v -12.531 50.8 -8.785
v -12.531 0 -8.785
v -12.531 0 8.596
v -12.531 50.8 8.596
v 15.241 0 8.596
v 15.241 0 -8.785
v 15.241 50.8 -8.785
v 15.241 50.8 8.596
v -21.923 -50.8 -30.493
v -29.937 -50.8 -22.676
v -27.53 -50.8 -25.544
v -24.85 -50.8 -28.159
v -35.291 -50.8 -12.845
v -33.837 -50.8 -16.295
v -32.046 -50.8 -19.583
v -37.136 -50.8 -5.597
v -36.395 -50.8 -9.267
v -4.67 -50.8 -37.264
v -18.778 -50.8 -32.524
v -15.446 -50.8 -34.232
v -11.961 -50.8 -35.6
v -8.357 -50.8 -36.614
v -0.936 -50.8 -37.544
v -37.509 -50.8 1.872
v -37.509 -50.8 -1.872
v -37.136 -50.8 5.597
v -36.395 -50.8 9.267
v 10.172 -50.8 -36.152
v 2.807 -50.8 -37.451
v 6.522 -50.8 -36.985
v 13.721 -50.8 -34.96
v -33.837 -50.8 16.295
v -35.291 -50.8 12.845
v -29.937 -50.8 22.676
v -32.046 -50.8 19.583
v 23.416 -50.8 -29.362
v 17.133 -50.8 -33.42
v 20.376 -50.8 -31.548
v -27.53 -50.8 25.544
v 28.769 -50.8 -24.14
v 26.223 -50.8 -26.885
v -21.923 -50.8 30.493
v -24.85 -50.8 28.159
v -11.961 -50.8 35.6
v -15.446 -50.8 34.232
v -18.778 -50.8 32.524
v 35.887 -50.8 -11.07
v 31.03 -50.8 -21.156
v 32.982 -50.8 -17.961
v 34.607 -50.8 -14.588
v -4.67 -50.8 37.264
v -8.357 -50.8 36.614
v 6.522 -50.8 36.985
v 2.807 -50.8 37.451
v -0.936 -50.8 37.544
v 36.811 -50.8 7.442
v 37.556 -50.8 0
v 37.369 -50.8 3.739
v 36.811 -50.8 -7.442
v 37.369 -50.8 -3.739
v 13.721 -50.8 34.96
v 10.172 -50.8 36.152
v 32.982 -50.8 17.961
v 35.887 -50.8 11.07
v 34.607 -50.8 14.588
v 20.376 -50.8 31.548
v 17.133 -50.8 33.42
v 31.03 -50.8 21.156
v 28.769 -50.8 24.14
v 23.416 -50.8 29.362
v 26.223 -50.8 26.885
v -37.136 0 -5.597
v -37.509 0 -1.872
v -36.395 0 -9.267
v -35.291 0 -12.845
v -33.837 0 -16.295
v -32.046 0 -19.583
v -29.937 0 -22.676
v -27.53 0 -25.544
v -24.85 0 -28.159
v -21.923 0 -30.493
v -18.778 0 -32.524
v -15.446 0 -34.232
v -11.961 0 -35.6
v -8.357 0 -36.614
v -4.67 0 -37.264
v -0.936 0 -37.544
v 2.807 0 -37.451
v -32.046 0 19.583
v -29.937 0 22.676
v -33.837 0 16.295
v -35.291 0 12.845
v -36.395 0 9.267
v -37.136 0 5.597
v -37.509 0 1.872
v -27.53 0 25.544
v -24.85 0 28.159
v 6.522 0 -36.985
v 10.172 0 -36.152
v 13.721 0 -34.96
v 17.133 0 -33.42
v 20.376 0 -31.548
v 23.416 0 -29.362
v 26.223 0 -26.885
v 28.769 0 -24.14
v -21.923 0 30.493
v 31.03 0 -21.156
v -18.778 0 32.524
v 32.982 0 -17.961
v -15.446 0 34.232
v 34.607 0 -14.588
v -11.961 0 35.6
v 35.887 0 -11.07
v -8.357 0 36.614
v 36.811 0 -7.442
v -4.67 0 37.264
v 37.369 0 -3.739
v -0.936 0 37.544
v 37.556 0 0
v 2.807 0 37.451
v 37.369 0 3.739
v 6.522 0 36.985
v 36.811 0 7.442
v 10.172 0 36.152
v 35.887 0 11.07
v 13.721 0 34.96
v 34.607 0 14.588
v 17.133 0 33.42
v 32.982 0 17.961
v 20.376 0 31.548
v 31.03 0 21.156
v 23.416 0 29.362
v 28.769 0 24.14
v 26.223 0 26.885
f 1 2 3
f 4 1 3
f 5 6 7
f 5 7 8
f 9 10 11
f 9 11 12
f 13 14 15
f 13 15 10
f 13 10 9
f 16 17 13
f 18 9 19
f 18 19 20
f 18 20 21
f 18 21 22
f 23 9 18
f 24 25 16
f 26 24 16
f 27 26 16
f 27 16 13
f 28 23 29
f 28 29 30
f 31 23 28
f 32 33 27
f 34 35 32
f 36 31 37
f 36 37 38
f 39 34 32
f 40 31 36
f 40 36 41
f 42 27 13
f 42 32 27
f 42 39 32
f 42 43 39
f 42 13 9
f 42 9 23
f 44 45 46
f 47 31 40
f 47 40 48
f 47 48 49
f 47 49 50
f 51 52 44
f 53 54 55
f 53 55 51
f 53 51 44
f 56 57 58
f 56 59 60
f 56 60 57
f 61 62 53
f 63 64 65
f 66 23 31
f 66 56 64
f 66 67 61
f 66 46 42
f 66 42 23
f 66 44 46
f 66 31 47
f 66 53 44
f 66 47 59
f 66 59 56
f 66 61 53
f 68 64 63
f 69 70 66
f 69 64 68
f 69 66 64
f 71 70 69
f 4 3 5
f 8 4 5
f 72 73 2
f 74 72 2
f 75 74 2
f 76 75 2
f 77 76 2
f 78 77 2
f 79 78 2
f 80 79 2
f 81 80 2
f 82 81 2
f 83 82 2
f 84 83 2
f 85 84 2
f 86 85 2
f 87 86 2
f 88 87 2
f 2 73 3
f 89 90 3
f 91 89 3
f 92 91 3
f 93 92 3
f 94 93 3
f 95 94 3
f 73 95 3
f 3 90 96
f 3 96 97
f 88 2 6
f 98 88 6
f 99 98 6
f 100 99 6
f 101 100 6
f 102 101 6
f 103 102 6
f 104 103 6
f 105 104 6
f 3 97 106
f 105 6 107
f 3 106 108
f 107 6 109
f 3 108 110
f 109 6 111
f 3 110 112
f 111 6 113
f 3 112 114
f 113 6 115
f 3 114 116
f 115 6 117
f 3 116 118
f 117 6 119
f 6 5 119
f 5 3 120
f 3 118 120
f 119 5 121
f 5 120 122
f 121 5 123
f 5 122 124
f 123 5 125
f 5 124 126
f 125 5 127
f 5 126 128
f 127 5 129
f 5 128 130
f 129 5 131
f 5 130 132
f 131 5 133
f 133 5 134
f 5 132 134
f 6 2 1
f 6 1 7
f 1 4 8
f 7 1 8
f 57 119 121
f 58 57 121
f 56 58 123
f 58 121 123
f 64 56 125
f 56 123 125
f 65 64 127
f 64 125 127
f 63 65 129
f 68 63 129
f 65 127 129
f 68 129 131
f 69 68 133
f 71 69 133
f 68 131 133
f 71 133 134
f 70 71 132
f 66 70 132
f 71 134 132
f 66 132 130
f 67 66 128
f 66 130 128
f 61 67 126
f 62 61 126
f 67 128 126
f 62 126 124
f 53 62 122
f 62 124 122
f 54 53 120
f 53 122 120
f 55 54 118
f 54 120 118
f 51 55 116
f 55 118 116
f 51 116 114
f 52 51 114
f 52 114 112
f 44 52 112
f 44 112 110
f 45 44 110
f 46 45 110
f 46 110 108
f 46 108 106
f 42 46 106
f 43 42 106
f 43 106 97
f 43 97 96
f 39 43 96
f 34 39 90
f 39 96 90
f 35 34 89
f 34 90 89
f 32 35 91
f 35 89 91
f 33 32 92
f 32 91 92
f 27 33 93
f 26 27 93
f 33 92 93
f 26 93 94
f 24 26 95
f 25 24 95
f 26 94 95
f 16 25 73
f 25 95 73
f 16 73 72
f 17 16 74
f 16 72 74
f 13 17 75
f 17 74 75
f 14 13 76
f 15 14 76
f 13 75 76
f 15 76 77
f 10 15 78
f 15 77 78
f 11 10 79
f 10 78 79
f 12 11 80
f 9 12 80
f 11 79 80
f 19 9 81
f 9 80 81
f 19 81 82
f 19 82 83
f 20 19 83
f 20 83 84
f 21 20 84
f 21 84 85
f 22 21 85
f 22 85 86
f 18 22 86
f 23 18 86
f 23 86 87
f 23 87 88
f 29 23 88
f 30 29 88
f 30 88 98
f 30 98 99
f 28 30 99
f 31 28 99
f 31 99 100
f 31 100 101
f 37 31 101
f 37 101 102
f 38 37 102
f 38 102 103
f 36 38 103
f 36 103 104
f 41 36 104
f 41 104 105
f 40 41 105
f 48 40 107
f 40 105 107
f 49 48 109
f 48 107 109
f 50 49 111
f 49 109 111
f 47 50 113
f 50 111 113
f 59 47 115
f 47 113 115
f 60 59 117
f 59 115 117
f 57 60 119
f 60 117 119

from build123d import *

# Parameters (mm, degrees)
F0_R     = 37.55585
F1_DEPTH = 50.8
F2_W     = 27.772067
F2_H     = 17.381157
F3_DEPTH = 50.8


with BuildPart() as f1:
    # F0 (on Front) → F1 (new body)
    with BuildSketch(Plane.XZ):
        Circle(F0_R)
    extrude(amount=F1_DEPTH)

    # F2 (on Front) → F3 (join)
    with BuildSketch(Plane.XZ):
        with Locations((1.355114, -0.094462)):
            Rectangle(F2_W, F2_H)
    extrude(amount=-F3_DEPTH)


solid = f1.part
